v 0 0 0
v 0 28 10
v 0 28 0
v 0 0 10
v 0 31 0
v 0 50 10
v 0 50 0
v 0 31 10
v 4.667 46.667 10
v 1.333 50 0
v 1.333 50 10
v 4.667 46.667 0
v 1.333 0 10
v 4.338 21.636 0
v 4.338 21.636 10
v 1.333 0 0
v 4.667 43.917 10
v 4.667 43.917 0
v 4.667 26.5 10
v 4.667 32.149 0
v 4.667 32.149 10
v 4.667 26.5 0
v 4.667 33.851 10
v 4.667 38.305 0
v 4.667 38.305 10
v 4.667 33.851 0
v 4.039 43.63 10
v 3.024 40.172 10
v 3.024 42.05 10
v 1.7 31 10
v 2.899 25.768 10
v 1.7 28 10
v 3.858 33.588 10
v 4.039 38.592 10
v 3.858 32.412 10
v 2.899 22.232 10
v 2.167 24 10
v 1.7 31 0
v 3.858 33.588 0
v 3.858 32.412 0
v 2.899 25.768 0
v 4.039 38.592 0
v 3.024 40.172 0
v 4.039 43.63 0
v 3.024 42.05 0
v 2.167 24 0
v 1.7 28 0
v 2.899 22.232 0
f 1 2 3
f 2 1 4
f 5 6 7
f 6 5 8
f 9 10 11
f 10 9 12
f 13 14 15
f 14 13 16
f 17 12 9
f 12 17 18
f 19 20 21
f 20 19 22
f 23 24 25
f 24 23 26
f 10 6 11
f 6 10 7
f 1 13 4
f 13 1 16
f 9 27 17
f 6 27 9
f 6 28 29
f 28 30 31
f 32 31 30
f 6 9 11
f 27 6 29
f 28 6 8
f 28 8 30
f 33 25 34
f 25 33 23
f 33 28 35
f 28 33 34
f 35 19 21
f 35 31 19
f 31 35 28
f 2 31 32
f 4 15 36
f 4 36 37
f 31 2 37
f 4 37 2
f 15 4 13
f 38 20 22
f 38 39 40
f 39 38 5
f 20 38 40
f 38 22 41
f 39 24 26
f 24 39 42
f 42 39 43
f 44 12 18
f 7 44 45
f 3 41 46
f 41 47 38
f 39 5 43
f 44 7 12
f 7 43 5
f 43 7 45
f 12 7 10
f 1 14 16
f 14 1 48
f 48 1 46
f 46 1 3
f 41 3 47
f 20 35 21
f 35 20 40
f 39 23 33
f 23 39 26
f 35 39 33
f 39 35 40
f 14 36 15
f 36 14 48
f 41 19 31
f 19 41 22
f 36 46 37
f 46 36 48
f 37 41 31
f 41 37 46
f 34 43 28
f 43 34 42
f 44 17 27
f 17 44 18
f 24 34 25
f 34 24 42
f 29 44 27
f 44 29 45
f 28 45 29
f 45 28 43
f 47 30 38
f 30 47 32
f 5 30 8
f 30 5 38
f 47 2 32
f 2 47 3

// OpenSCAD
PEG (50, 10);

module PEG (lenght, width) {
	A=lenght;
	B=lenght*(2/75);
	C=lenght*(7/75);
	D=lenght*(70/75);
	E=lenght*(36/75);	
	difference(){	
		linear_extrude(height=width)
		polygon(points=[[0,0],[0,A],[B,A],[C,D],[C,E],[B,0]],paths=[[0,1,2,3,4,5]]);
		translate([C,E+9,0]) cylinder(h = width, r=1);
		translate([C,E,0]) cylinder(h = width, r=2.5);
		translate([C*((A/15)/2.5),D-(A/9),0]) cylinder(h = width, r=A/15);
		translate([0,E+4,0]) cube([1.7,3,width]);	
	}
}
